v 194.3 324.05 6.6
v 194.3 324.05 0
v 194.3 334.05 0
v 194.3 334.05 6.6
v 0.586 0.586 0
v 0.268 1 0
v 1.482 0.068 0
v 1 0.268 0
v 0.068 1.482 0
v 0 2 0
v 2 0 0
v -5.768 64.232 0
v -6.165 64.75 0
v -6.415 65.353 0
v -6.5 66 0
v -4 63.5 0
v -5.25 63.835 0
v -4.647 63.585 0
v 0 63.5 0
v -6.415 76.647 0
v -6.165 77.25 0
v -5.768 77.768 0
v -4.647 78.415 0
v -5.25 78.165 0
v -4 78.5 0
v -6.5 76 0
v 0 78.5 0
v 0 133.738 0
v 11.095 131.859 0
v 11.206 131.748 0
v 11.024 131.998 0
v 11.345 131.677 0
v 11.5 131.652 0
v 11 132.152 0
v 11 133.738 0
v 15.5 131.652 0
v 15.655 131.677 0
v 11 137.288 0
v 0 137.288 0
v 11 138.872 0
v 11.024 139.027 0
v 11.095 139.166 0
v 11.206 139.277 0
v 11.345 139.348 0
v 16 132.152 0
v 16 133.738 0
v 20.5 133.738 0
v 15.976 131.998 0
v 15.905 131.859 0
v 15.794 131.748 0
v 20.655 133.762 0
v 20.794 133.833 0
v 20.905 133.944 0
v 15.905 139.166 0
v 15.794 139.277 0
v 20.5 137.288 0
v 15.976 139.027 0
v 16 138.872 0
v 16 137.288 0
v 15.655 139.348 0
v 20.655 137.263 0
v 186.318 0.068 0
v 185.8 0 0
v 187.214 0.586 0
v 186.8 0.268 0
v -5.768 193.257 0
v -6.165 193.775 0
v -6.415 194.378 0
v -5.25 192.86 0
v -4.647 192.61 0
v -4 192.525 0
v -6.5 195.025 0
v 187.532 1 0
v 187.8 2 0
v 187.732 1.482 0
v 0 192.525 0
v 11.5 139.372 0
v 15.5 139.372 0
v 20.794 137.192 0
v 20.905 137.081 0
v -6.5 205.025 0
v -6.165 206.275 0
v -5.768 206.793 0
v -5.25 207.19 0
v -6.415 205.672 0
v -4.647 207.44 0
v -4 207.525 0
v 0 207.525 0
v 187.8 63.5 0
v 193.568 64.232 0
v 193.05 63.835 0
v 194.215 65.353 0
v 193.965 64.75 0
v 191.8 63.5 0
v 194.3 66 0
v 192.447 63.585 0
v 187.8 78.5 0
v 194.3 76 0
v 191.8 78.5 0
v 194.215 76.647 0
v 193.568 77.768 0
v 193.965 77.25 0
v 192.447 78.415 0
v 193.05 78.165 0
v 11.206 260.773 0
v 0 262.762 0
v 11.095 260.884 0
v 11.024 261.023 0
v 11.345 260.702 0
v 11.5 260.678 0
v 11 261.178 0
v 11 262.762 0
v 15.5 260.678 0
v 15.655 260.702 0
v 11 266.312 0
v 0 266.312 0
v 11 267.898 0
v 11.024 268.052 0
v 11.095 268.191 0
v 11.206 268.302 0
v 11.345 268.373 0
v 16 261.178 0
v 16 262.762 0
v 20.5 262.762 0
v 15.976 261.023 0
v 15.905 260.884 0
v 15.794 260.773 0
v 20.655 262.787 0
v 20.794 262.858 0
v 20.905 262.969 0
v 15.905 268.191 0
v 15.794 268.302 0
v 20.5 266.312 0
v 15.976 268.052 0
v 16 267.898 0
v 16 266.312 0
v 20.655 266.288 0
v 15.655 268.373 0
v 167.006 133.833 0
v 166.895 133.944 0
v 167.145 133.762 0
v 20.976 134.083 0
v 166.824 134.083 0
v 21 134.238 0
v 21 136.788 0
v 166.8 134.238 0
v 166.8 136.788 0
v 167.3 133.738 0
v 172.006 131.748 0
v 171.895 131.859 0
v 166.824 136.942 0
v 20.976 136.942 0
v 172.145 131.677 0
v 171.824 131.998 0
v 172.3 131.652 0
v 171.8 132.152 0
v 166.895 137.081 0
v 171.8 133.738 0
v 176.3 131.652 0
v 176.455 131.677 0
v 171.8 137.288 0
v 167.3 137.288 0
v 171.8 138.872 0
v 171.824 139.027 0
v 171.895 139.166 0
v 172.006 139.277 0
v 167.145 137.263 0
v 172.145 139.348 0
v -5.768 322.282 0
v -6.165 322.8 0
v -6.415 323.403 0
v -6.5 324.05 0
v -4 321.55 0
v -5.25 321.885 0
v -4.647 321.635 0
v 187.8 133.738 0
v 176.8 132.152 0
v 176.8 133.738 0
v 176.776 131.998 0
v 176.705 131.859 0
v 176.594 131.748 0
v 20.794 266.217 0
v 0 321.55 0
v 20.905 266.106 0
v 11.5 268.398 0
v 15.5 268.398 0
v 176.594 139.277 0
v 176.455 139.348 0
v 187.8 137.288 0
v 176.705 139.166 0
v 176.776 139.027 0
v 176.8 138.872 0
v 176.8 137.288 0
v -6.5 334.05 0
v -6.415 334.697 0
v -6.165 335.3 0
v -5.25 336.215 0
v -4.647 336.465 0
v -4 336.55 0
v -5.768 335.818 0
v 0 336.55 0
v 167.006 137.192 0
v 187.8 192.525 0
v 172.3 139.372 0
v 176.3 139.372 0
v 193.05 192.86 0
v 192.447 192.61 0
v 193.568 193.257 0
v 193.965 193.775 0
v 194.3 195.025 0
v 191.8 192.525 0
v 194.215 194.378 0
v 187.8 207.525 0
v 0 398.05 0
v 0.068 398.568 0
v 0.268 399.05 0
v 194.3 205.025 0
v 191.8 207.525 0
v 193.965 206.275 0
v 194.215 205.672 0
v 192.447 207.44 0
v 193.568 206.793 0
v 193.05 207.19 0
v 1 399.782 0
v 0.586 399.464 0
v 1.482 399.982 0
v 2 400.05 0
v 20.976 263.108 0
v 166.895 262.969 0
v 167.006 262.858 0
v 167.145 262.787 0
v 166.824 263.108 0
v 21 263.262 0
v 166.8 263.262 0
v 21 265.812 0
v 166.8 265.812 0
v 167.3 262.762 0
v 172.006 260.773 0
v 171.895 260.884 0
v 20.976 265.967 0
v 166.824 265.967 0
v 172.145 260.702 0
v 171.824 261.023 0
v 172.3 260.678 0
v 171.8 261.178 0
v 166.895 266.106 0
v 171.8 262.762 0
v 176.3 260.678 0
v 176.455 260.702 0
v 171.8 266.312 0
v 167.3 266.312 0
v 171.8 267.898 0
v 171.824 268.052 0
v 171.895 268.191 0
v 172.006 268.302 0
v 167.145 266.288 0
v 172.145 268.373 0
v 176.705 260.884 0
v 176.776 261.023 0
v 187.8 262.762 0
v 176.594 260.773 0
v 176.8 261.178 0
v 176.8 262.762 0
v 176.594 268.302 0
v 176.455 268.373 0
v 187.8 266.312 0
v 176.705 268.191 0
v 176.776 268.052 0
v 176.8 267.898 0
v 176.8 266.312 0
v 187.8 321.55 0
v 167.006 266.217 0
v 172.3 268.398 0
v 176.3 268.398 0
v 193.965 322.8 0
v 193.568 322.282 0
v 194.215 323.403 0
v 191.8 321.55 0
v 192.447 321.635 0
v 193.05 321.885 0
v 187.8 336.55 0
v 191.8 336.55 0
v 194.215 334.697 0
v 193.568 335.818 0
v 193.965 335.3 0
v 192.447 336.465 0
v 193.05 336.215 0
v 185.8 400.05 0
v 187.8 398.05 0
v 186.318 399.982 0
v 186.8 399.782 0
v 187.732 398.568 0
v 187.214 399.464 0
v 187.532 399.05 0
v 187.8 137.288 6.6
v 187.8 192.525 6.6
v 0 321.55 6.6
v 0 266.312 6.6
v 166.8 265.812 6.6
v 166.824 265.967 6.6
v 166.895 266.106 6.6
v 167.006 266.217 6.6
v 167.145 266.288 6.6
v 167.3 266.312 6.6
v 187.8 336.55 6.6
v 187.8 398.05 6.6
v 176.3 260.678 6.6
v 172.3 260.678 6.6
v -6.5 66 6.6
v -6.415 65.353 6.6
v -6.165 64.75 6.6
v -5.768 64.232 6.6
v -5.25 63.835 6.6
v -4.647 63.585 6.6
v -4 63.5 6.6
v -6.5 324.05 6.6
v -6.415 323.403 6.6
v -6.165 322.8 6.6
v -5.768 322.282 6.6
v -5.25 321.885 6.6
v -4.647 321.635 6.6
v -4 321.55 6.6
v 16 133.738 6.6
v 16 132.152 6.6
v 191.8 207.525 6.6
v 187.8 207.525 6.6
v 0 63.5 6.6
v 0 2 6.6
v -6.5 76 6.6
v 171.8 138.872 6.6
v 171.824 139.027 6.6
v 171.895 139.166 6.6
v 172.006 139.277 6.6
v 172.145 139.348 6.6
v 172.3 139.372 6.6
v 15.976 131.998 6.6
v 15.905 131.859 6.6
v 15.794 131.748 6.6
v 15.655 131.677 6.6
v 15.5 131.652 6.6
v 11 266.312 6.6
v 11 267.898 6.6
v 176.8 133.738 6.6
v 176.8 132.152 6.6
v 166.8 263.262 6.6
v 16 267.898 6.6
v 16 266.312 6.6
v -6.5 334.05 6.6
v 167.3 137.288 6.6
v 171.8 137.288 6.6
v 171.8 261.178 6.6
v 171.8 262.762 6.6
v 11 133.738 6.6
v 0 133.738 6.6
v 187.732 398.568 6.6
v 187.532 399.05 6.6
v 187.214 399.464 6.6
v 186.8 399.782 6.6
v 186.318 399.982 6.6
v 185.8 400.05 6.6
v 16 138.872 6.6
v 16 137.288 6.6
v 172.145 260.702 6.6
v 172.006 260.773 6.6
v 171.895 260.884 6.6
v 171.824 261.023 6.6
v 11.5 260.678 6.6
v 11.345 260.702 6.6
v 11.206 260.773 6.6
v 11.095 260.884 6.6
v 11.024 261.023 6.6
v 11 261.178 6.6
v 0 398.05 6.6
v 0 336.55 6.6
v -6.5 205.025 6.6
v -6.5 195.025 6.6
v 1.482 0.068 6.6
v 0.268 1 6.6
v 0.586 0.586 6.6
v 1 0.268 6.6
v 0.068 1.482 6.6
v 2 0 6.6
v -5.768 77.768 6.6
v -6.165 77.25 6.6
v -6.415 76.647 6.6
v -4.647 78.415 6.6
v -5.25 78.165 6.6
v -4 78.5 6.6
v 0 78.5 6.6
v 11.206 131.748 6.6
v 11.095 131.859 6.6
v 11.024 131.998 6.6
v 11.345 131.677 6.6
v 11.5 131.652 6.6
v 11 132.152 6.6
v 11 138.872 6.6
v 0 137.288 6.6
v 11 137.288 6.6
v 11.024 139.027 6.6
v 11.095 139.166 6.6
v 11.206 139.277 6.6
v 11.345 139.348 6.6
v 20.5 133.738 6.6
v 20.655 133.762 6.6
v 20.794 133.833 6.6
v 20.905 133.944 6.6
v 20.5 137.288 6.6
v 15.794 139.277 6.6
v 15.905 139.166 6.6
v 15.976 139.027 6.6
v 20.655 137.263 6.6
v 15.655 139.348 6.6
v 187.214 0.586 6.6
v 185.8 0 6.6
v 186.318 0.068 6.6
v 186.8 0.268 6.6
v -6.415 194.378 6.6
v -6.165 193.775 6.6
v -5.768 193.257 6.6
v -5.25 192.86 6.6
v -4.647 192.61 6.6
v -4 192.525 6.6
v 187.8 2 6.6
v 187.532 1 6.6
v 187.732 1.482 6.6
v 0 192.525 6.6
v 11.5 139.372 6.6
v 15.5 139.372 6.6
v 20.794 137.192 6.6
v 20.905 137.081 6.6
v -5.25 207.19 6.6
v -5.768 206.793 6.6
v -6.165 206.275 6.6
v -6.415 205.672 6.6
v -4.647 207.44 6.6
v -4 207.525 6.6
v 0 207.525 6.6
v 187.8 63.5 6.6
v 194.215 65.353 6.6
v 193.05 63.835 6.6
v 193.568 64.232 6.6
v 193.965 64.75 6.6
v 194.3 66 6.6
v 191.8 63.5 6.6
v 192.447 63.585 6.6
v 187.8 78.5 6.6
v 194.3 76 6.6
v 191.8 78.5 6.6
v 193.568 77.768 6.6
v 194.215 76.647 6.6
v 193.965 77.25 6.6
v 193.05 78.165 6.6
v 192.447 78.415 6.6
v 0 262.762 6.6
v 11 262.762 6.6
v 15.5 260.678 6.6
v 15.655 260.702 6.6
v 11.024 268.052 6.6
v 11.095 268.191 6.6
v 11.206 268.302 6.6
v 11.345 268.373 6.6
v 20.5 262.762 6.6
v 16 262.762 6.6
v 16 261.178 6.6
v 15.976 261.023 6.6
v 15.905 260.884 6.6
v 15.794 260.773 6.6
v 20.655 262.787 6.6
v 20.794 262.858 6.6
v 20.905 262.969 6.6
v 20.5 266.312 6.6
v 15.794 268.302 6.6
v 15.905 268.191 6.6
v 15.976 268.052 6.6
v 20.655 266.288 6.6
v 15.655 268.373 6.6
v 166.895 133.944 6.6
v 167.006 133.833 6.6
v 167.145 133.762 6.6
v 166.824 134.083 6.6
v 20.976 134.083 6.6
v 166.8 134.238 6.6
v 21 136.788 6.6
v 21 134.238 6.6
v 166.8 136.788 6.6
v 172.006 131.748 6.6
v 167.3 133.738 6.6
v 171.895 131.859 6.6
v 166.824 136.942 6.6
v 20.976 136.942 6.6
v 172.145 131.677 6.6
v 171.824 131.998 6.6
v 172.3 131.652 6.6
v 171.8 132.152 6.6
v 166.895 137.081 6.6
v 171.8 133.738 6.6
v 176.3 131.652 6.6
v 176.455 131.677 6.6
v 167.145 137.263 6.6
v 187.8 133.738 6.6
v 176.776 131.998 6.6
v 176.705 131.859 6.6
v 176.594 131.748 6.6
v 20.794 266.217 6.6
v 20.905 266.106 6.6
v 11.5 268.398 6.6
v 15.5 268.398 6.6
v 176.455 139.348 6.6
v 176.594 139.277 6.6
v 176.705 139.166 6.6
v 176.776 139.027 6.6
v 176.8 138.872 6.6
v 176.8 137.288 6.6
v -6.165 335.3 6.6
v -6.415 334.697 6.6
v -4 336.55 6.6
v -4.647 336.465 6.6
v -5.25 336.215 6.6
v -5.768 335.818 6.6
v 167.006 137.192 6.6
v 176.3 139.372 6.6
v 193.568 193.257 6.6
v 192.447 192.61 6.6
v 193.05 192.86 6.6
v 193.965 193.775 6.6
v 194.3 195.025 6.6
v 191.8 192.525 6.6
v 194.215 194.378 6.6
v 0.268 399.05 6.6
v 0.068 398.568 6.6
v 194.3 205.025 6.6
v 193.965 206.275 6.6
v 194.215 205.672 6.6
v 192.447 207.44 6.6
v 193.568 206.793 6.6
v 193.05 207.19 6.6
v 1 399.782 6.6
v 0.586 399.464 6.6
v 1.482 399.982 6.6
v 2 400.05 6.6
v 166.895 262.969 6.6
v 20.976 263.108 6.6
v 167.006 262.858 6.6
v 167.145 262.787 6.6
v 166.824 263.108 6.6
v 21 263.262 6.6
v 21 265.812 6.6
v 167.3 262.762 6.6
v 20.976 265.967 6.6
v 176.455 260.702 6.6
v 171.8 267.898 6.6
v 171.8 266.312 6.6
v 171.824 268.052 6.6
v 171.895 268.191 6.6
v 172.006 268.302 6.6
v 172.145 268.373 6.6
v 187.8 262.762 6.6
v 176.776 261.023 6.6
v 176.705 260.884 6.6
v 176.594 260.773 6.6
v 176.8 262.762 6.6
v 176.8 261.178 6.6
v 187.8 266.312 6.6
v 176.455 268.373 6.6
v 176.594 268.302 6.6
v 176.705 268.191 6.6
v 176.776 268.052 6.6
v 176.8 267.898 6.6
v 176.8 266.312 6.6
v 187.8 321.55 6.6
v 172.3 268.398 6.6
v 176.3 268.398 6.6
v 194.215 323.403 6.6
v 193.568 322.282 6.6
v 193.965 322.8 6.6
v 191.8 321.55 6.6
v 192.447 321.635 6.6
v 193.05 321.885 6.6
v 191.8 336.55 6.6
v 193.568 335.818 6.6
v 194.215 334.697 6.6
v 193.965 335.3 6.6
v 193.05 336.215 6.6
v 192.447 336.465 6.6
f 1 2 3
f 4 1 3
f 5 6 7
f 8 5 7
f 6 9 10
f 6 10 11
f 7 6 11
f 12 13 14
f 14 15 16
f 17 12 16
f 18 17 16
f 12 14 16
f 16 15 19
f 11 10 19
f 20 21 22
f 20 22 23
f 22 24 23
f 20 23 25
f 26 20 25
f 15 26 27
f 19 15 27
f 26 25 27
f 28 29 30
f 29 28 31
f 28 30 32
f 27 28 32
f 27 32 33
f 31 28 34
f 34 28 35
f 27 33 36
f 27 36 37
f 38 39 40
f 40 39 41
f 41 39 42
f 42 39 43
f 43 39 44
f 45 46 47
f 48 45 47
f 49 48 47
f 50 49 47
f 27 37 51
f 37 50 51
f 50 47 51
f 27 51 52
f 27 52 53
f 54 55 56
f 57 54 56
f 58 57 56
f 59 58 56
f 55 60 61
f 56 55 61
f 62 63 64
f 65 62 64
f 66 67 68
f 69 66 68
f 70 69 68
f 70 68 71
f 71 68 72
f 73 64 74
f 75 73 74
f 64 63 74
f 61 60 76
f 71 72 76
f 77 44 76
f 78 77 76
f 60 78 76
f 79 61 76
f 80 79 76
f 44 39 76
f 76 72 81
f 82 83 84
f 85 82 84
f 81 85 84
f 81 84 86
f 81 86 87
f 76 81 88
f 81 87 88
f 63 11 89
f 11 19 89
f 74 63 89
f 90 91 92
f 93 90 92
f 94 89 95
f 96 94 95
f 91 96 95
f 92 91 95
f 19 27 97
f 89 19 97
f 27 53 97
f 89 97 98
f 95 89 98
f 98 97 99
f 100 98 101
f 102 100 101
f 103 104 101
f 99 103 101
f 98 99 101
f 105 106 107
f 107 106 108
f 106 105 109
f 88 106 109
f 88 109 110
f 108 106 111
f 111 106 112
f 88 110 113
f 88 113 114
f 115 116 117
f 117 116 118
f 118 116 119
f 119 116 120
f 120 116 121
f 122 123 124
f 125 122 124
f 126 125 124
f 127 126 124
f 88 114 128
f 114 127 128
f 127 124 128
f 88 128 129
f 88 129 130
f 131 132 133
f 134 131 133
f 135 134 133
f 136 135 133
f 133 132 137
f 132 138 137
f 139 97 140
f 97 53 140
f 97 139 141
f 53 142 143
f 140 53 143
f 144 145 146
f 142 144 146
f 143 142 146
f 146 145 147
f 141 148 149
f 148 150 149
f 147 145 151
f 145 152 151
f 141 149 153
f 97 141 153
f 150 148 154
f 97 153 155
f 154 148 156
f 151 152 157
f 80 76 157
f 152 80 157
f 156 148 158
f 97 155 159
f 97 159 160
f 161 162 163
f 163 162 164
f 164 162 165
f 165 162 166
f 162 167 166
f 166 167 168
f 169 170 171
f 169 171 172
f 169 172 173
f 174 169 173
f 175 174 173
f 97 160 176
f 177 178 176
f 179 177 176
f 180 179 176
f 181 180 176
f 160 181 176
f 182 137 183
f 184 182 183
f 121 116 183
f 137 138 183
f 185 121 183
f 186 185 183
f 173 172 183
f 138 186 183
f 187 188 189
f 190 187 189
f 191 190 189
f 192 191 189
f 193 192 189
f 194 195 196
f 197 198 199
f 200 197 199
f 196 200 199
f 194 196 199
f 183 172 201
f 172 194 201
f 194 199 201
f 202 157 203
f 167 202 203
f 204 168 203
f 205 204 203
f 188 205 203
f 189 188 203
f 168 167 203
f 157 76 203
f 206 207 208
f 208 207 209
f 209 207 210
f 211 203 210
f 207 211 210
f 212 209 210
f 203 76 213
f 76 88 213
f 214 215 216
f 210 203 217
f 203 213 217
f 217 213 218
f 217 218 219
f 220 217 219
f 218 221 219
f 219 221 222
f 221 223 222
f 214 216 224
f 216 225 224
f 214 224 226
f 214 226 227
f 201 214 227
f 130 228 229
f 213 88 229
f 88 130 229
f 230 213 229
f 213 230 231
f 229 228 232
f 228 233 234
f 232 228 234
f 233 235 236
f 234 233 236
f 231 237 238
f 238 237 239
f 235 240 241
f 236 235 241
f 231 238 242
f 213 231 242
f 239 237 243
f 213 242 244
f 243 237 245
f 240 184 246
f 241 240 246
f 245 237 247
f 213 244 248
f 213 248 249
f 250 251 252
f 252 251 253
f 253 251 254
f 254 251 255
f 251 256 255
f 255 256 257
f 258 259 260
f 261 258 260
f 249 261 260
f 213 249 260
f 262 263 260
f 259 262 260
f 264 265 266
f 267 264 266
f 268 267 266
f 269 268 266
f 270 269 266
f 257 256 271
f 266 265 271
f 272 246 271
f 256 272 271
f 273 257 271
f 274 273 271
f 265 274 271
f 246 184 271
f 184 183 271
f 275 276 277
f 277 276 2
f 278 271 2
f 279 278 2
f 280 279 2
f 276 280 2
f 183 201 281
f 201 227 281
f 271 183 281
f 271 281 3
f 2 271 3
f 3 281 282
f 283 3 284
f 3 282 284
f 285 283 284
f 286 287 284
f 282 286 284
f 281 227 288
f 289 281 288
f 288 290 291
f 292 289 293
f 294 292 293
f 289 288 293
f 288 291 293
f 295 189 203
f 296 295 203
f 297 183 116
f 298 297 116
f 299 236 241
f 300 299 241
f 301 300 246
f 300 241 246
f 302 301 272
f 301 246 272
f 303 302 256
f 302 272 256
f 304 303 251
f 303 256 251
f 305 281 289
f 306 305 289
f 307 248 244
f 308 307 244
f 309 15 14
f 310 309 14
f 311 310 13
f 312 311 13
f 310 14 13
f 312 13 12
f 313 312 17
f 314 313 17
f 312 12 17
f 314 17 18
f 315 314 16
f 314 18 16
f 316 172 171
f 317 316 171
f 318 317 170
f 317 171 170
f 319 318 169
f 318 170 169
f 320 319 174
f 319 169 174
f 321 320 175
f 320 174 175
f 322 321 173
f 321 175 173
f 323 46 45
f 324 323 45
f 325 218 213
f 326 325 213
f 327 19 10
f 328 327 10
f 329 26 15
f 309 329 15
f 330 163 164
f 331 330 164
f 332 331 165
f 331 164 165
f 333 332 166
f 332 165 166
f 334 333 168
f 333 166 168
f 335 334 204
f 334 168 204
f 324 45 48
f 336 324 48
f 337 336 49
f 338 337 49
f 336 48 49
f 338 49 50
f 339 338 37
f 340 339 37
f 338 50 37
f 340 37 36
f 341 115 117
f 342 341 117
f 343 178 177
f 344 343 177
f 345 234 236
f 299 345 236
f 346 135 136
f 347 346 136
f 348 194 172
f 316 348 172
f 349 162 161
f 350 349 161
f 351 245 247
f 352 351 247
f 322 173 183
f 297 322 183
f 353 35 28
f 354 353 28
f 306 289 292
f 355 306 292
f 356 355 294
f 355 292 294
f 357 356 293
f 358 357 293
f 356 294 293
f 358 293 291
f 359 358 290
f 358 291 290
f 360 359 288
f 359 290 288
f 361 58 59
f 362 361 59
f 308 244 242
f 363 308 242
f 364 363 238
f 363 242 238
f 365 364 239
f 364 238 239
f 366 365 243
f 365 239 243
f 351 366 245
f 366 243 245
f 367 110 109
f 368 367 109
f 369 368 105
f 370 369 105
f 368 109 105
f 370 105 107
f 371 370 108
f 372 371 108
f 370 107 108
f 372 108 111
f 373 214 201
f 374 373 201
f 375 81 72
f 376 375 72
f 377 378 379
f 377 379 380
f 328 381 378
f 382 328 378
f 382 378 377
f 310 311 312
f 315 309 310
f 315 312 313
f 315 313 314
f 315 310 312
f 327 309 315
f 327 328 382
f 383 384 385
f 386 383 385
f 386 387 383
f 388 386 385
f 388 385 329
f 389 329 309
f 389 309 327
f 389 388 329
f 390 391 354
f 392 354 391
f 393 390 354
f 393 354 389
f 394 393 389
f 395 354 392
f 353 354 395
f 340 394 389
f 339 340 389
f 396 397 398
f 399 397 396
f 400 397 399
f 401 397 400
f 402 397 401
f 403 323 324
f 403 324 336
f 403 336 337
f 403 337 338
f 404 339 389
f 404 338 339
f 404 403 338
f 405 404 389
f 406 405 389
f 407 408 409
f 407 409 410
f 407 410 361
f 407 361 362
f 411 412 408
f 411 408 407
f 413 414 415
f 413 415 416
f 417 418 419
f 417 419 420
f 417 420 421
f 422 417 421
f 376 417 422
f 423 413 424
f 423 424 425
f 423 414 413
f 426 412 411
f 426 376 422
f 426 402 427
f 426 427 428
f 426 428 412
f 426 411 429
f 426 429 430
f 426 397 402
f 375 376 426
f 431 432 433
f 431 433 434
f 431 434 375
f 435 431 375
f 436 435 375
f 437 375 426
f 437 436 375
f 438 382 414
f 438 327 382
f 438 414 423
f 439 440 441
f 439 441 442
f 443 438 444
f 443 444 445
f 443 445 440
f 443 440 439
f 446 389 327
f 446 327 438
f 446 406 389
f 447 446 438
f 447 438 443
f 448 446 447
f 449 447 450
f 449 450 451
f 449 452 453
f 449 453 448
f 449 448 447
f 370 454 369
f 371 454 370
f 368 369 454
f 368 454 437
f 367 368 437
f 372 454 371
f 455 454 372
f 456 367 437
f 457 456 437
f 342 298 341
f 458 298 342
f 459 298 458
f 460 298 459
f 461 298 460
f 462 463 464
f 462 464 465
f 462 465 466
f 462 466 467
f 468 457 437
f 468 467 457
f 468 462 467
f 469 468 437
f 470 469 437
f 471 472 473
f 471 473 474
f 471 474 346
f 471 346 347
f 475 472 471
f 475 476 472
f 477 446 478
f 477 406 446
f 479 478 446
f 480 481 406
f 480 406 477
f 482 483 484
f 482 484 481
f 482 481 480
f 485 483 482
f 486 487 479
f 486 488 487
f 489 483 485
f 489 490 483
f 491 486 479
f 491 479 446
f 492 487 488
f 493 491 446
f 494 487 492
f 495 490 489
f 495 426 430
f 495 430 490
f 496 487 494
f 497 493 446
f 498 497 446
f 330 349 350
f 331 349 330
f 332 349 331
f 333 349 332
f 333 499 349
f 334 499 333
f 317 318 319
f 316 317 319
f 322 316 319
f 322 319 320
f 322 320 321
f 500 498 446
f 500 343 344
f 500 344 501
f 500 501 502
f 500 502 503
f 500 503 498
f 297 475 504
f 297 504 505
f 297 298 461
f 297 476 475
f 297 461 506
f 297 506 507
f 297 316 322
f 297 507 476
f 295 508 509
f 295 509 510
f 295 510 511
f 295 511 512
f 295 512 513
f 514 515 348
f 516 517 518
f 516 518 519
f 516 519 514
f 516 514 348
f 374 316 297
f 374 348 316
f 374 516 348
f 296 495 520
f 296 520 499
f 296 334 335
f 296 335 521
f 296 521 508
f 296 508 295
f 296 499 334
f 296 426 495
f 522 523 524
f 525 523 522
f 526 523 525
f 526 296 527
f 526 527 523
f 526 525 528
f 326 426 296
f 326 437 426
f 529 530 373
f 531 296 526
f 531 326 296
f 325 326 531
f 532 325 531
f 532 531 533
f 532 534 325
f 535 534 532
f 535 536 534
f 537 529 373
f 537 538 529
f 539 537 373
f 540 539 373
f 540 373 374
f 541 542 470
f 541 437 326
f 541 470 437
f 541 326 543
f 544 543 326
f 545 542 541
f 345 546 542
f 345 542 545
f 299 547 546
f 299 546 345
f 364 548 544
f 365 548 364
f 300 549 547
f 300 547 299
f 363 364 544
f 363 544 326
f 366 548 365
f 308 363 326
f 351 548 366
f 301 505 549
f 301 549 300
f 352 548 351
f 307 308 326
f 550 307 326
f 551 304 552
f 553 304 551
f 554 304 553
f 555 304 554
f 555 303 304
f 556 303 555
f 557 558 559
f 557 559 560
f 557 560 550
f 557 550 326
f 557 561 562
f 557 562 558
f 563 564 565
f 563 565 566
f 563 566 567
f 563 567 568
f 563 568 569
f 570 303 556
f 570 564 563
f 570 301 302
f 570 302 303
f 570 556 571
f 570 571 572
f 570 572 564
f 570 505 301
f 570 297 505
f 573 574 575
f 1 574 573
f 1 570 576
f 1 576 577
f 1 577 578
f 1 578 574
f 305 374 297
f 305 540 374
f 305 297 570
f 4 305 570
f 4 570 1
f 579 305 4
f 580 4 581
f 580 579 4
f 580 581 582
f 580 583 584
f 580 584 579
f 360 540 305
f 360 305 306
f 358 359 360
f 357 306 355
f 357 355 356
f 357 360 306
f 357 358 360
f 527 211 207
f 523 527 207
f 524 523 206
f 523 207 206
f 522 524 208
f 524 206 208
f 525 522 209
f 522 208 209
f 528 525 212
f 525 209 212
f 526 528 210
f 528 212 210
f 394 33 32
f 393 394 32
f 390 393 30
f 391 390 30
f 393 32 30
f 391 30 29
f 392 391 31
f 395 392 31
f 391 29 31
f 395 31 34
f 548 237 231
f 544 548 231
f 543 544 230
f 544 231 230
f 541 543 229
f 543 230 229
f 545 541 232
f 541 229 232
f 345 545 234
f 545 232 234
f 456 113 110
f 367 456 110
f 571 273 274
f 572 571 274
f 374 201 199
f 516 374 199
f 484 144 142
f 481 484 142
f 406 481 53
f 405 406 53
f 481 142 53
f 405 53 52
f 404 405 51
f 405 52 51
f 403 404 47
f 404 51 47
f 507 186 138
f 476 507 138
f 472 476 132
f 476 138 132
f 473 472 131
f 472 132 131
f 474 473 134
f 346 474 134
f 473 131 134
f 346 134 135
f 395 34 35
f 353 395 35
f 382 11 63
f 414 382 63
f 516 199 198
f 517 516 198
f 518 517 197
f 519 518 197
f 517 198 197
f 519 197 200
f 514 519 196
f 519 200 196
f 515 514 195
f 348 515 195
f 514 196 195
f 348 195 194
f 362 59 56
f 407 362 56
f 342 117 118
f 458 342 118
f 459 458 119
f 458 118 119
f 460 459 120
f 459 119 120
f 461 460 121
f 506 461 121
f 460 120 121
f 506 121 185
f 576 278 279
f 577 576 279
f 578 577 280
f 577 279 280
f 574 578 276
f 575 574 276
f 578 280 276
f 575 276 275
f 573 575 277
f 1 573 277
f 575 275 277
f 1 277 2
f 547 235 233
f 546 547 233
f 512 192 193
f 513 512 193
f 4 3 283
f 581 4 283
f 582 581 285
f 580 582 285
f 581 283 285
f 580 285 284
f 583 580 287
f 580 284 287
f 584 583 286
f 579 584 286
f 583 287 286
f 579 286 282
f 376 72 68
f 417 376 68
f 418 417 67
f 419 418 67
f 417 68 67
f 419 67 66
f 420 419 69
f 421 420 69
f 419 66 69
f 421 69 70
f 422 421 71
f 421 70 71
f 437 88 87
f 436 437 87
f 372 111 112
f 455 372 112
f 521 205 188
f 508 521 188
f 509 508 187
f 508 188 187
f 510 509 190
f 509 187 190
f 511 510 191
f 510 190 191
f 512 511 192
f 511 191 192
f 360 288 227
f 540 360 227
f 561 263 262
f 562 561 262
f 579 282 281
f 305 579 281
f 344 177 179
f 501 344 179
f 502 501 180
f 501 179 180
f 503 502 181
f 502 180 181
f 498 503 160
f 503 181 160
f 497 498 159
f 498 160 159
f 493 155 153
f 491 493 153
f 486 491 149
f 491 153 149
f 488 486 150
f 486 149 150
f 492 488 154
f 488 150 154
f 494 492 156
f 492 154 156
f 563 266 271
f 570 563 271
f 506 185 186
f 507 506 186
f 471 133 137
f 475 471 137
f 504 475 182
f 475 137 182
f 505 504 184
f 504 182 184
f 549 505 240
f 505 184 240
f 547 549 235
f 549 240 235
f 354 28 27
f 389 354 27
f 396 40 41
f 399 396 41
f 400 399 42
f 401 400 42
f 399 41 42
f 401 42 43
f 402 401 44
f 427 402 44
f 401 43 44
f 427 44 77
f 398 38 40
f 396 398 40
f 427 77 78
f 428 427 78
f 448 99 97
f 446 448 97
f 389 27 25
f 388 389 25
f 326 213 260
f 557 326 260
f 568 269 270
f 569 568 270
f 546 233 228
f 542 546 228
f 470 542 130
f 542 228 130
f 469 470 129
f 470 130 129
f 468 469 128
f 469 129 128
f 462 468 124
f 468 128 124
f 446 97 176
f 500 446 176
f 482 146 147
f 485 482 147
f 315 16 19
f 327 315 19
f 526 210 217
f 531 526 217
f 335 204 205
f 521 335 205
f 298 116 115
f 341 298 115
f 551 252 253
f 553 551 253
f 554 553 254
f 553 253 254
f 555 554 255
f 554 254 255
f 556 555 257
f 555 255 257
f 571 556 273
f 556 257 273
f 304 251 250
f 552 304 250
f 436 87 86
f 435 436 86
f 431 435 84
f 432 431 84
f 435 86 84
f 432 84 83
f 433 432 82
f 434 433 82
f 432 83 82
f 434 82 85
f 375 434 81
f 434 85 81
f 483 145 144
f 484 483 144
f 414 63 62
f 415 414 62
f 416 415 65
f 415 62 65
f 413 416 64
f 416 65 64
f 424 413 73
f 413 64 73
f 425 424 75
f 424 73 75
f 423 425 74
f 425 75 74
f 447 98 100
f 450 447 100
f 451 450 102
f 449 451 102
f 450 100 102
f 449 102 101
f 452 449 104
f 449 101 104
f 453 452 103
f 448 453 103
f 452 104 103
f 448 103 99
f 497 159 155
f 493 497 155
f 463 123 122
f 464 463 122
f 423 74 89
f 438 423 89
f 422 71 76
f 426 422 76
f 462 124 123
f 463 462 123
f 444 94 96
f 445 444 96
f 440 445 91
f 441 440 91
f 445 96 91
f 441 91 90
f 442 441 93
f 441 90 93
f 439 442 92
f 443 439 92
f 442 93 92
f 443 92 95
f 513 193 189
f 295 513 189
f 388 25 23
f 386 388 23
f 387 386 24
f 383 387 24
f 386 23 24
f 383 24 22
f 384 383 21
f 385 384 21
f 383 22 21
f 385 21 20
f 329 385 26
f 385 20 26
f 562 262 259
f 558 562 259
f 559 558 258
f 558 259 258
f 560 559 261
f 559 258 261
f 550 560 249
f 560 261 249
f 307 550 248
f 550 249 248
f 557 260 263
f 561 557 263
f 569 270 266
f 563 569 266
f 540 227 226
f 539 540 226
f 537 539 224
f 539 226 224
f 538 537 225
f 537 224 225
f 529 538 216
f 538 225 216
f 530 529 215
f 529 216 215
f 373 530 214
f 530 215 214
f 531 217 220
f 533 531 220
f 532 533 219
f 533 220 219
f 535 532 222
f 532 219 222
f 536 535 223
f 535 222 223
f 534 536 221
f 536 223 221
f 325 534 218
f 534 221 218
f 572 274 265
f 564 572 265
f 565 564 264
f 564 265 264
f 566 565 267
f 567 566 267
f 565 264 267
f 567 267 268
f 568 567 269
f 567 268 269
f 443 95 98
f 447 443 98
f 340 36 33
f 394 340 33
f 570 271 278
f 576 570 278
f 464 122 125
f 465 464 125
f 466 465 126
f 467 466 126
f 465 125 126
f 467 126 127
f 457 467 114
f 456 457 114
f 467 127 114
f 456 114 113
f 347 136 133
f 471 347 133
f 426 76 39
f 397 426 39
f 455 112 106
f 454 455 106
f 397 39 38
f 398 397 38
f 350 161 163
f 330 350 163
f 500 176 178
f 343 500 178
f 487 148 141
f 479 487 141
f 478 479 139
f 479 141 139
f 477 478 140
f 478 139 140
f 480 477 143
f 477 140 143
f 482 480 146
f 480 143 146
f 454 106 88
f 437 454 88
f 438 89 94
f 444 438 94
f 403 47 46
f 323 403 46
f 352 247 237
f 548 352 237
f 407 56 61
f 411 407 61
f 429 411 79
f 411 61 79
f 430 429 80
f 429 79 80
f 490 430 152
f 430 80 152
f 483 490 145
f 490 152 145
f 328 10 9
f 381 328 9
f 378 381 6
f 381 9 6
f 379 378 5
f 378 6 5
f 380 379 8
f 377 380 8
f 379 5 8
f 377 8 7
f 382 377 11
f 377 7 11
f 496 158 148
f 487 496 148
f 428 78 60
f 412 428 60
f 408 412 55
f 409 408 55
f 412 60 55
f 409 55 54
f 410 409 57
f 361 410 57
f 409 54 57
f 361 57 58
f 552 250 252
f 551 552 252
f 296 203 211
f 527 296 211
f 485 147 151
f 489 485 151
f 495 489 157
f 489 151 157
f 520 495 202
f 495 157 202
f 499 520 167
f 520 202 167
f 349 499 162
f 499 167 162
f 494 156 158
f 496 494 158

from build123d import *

# Parameters (mm, degrees)
BOSS_EXTRUDE1_DEPTH = 6.6


with BuildPart() as part:
    # Model → Boss-Extrude1 (new body)
    with BuildSketch(Plane.XY):
        with BuildLine():
            Line((-6.5, 76), (-6.5, 66))
            ThreePointArc((-6.5, 66), (-5.767766953, 64.232233047), (-4, 63.5))
            Line((-4, 63.5), (0, 63.5))
            Line((0, 63.5), (0, 2))
            ThreePointArc((0, 2), (0.585786438, 0.585786438), (2, 0))
            Line((2, 0), (185.8, 0))
            ThreePointArc((185.8, 0), (187.214213562, 0.585786438), (187.8, 2))
            Line((187.8, 2), (187.8, 63.5))
            Line((187.8, 63.5), (191.8, 63.5))
            ThreePointArc((191.8, 63.5), (193.567766953, 64.232233047), (194.3, 66))
            Line((194.3, 66), (194.3, 76))
            ThreePointArc((194.3, 76), (193.567766953, 77.767766953), (191.8, 78.5))
            Line((191.8, 78.5), (187.8, 78.5))
            Line((187.8, 78.5), (187.8, 133.7375))
            Line((187.8, 133.7375), (176.8, 133.7375))
            Line((176.8, 133.7375), (176.8, 132.1525))
            ThreePointArc((176.8, 132.1525), (176.653553391, 131.798946609), (176.3, 131.6525))
            Line((176.3, 131.6525), (172.3, 131.6525))
            ThreePointArc((172.3, 131.6525), (171.946446609, 131.798946609), (171.8, 132.1525))
            Line((171.8, 132.1525), (171.8, 133.7375))
            Line((171.8, 133.7375), (167.3, 133.7375))
            ThreePointArc((167.3, 133.7375), (166.946446609, 133.883946609), (166.8, 134.2375))
            Line((166.8, 134.2375), (166.8, 136.7875))
            ThreePointArc((166.8, 136.7875), (166.946446609, 137.141053391), (167.3, 137.2875))
            Line((167.3, 137.2875), (171.8, 137.2875))
            Line((171.8, 137.2875), (171.8, 138.8725))
            ThreePointArc((171.8, 138.8725), (171.946446609, 139.226053391), (172.3, 139.3725))
            Line((172.3, 139.3725), (176.3, 139.3725))
            ThreePointArc((176.3, 139.3725), (176.653553391, 139.226053391), (176.8, 138.8725))
            Line((176.8, 138.8725), (176.8, 137.2875))
            Line((176.8, 137.2875), (187.8, 137.2875))
            Line((187.8, 137.2875), (187.8, 192.525))
            Line((187.8, 192.525), (191.8, 192.525))
            ThreePointArc((191.8, 192.525), (193.567766953, 193.257233047), (194.3, 195.025))
            Line((194.3, 195.025), (194.3, 205.025))
            ThreePointArc((194.3, 205.025), (193.567766953, 206.792766953), (191.8, 207.525))
            Line((191.8, 207.525), (187.8, 207.525))
            Line((187.8, 207.525), (187.8, 262.7625))
            Line((187.8, 262.7625), (176.8, 262.7625))
            Line((176.8, 262.7625), (176.8, 261.1775))
            ThreePointArc((176.8, 261.1775), (176.653553391, 260.823946609), (176.3, 260.6775))
            Line((176.3, 260.6775), (172.3, 260.6775))
            ThreePointArc((172.3, 260.6775), (171.946446609, 260.823946609), (171.8, 261.1775))
            Line((171.8, 261.1775), (171.8, 262.7625))
            Line((171.8, 262.7625), (167.3, 262.7625))
            ThreePointArc((167.3, 262.7625), (166.946446609, 262.908946609), (166.8, 263.2625))
            Line((166.8, 263.2625), (166.8, 265.8125))
            ThreePointArc((166.8, 265.8125), (166.946446609, 266.166053391), (167.3, 266.3125))
            Line((167.3, 266.3125), (171.8, 266.3125))
            Line((171.8, 266.3125), (171.8, 267.8975))
            ThreePointArc((171.8, 267.8975), (171.946446609, 268.251053391), (172.3, 268.3975))
            Line((172.3, 268.3975), (176.3, 268.3975))
            ThreePointArc((176.3, 268.3975), (176.653553391, 268.251053391), (176.8, 267.8975))
            Line((176.8, 267.8975), (176.8, 266.3125))
            Line((176.8, 266.3125), (187.8, 266.3125))
            Line((187.8, 266.3125), (187.8, 321.55))
            Line((187.8, 321.55), (191.8, 321.55))
            ThreePointArc((191.8, 321.55), (193.567766953, 322.282233047), (194.3, 324.05))
            Line((194.3, 324.05), (194.3, 334.05))
            ThreePointArc((194.3, 334.05), (193.567766953, 335.817766953), (191.8, 336.55))
            Line((191.8, 336.55), (187.8, 336.55))
            Line((187.8, 336.55), (187.8, 398.05))
            ThreePointArc((187.8, 398.05), (187.214213562, 399.464213562), (185.8, 400.05))
            Line((185.8, 400.05), (2, 400.05))
            ThreePointArc((2, 400.05), (0.585786438, 399.464213562), (0, 398.05))
            Line((0, 398.05), (0, 336.55))
            Line((0, 336.55), (-4, 336.55))
            ThreePointArc((-4, 336.55), (-5.767766953, 335.817766953), (-6.5, 334.05))
            Line((-6.5, 334.05), (-6.5, 324.05))
            ThreePointArc((-6.5, 324.05), (-5.767766953, 322.282233047), (-4, 321.55))
            Line((-4, 321.55), (0, 321.55))
            Line((0, 321.55), (0, 266.3125))
            Line((0, 266.3125), (11, 266.3125))
            Line((11, 266.3125), (11, 267.8975))
            ThreePointArc((11, 267.8975), (11.146446609, 268.251053391), (11.5, 268.3975))
            Line((11.5, 268.3975), (15.5, 268.3975))
            ThreePointArc((15.5, 268.3975), (15.853553391, 268.251053391), (16, 267.8975))
            Line((16, 267.8975), (16, 266.3125))
            Line((16, 266.3125), (20.5, 266.3125))
            ThreePointArc((20.5, 266.3125), (20.853553391, 266.166053391), (21, 265.8125))
            Line((21, 265.8125), (21, 263.2625))
            ThreePointArc((21, 263.2625), (20.853553391, 262.908946609), (20.5, 262.7625))
            Line((20.5, 262.7625), (16, 262.7625))
            Line((16, 262.7625), (16, 261.1775))
            ThreePointArc((16, 261.1775), (15.853553391, 260.823946609), (15.5, 260.6775))
            Line((15.5, 260.6775), (11.5, 260.6775))
            ThreePointArc((11.5, 260.6775), (11.146446609, 260.823946609), (11, 261.1775))
            Line((11, 261.1775), (11, 262.7625))
            Line((11, 262.7625), (0, 262.7625))
            Line((0, 262.7625), (0, 207.525))
            Line((0, 207.525), (-4, 207.525))
            ThreePointArc((-4, 207.525), (-5.767766953, 206.792766953), (-6.5, 205.025))
            Line((-6.5, 205.025), (-6.5, 195.025))
            ThreePointArc((-6.5, 195.025), (-5.767766953, 193.257233047), (-4, 192.525))
            Line((-4, 192.525), (0, 192.525))
            Line((0, 192.525), (0, 137.2875))
            Line((0, 137.2875), (11, 137.2875))
            Line((11, 137.2875), (11, 138.8725))
            ThreePointArc((11, 138.8725), (11.146446609, 139.226053391), (11.5, 139.3725))
            Line((11.5, 139.3725), (15.5, 139.3725))
            ThreePointArc((15.5, 139.3725), (15.853553391, 139.226053391), (16, 138.8725))
            Line((16, 138.8725), (16, 137.2875))
            Line((16, 137.2875), (20.5, 137.2875))
            ThreePointArc((20.5, 137.2875), (20.853553391, 137.141053391), (21, 136.7875))
            Line((21, 136.7875), (21, 134.2375))
            ThreePointArc((21, 134.2375), (20.853553391, 133.883946609), (20.5, 133.7375))
            Line((20.5, 133.7375), (16, 133.7375))
            Line((16, 133.7375), (16, 132.1525))
            ThreePointArc((16, 132.1525), (15.853553391, 131.798946609), (15.5, 131.6525))
            Line((15.5, 131.6525), (11.5, 131.6525))
            ThreePointArc((11.5, 131.6525), (11.146446609, 131.798946609), (11, 132.1525))
            Line((11, 132.1525), (11, 133.7375))
            Line((11, 133.7375), (0, 133.7375))
            Line((0, 133.7375), (0, 78.5))
            Line((0, 78.5), (-4, 78.5))
            ThreePointArc((-4, 78.5), (-5.767766953, 77.767766953), (-6.5, 76))
        make_face()
    extrude(amount=BOSS_EXTRUDE1_DEPTH)


solid = part.part
